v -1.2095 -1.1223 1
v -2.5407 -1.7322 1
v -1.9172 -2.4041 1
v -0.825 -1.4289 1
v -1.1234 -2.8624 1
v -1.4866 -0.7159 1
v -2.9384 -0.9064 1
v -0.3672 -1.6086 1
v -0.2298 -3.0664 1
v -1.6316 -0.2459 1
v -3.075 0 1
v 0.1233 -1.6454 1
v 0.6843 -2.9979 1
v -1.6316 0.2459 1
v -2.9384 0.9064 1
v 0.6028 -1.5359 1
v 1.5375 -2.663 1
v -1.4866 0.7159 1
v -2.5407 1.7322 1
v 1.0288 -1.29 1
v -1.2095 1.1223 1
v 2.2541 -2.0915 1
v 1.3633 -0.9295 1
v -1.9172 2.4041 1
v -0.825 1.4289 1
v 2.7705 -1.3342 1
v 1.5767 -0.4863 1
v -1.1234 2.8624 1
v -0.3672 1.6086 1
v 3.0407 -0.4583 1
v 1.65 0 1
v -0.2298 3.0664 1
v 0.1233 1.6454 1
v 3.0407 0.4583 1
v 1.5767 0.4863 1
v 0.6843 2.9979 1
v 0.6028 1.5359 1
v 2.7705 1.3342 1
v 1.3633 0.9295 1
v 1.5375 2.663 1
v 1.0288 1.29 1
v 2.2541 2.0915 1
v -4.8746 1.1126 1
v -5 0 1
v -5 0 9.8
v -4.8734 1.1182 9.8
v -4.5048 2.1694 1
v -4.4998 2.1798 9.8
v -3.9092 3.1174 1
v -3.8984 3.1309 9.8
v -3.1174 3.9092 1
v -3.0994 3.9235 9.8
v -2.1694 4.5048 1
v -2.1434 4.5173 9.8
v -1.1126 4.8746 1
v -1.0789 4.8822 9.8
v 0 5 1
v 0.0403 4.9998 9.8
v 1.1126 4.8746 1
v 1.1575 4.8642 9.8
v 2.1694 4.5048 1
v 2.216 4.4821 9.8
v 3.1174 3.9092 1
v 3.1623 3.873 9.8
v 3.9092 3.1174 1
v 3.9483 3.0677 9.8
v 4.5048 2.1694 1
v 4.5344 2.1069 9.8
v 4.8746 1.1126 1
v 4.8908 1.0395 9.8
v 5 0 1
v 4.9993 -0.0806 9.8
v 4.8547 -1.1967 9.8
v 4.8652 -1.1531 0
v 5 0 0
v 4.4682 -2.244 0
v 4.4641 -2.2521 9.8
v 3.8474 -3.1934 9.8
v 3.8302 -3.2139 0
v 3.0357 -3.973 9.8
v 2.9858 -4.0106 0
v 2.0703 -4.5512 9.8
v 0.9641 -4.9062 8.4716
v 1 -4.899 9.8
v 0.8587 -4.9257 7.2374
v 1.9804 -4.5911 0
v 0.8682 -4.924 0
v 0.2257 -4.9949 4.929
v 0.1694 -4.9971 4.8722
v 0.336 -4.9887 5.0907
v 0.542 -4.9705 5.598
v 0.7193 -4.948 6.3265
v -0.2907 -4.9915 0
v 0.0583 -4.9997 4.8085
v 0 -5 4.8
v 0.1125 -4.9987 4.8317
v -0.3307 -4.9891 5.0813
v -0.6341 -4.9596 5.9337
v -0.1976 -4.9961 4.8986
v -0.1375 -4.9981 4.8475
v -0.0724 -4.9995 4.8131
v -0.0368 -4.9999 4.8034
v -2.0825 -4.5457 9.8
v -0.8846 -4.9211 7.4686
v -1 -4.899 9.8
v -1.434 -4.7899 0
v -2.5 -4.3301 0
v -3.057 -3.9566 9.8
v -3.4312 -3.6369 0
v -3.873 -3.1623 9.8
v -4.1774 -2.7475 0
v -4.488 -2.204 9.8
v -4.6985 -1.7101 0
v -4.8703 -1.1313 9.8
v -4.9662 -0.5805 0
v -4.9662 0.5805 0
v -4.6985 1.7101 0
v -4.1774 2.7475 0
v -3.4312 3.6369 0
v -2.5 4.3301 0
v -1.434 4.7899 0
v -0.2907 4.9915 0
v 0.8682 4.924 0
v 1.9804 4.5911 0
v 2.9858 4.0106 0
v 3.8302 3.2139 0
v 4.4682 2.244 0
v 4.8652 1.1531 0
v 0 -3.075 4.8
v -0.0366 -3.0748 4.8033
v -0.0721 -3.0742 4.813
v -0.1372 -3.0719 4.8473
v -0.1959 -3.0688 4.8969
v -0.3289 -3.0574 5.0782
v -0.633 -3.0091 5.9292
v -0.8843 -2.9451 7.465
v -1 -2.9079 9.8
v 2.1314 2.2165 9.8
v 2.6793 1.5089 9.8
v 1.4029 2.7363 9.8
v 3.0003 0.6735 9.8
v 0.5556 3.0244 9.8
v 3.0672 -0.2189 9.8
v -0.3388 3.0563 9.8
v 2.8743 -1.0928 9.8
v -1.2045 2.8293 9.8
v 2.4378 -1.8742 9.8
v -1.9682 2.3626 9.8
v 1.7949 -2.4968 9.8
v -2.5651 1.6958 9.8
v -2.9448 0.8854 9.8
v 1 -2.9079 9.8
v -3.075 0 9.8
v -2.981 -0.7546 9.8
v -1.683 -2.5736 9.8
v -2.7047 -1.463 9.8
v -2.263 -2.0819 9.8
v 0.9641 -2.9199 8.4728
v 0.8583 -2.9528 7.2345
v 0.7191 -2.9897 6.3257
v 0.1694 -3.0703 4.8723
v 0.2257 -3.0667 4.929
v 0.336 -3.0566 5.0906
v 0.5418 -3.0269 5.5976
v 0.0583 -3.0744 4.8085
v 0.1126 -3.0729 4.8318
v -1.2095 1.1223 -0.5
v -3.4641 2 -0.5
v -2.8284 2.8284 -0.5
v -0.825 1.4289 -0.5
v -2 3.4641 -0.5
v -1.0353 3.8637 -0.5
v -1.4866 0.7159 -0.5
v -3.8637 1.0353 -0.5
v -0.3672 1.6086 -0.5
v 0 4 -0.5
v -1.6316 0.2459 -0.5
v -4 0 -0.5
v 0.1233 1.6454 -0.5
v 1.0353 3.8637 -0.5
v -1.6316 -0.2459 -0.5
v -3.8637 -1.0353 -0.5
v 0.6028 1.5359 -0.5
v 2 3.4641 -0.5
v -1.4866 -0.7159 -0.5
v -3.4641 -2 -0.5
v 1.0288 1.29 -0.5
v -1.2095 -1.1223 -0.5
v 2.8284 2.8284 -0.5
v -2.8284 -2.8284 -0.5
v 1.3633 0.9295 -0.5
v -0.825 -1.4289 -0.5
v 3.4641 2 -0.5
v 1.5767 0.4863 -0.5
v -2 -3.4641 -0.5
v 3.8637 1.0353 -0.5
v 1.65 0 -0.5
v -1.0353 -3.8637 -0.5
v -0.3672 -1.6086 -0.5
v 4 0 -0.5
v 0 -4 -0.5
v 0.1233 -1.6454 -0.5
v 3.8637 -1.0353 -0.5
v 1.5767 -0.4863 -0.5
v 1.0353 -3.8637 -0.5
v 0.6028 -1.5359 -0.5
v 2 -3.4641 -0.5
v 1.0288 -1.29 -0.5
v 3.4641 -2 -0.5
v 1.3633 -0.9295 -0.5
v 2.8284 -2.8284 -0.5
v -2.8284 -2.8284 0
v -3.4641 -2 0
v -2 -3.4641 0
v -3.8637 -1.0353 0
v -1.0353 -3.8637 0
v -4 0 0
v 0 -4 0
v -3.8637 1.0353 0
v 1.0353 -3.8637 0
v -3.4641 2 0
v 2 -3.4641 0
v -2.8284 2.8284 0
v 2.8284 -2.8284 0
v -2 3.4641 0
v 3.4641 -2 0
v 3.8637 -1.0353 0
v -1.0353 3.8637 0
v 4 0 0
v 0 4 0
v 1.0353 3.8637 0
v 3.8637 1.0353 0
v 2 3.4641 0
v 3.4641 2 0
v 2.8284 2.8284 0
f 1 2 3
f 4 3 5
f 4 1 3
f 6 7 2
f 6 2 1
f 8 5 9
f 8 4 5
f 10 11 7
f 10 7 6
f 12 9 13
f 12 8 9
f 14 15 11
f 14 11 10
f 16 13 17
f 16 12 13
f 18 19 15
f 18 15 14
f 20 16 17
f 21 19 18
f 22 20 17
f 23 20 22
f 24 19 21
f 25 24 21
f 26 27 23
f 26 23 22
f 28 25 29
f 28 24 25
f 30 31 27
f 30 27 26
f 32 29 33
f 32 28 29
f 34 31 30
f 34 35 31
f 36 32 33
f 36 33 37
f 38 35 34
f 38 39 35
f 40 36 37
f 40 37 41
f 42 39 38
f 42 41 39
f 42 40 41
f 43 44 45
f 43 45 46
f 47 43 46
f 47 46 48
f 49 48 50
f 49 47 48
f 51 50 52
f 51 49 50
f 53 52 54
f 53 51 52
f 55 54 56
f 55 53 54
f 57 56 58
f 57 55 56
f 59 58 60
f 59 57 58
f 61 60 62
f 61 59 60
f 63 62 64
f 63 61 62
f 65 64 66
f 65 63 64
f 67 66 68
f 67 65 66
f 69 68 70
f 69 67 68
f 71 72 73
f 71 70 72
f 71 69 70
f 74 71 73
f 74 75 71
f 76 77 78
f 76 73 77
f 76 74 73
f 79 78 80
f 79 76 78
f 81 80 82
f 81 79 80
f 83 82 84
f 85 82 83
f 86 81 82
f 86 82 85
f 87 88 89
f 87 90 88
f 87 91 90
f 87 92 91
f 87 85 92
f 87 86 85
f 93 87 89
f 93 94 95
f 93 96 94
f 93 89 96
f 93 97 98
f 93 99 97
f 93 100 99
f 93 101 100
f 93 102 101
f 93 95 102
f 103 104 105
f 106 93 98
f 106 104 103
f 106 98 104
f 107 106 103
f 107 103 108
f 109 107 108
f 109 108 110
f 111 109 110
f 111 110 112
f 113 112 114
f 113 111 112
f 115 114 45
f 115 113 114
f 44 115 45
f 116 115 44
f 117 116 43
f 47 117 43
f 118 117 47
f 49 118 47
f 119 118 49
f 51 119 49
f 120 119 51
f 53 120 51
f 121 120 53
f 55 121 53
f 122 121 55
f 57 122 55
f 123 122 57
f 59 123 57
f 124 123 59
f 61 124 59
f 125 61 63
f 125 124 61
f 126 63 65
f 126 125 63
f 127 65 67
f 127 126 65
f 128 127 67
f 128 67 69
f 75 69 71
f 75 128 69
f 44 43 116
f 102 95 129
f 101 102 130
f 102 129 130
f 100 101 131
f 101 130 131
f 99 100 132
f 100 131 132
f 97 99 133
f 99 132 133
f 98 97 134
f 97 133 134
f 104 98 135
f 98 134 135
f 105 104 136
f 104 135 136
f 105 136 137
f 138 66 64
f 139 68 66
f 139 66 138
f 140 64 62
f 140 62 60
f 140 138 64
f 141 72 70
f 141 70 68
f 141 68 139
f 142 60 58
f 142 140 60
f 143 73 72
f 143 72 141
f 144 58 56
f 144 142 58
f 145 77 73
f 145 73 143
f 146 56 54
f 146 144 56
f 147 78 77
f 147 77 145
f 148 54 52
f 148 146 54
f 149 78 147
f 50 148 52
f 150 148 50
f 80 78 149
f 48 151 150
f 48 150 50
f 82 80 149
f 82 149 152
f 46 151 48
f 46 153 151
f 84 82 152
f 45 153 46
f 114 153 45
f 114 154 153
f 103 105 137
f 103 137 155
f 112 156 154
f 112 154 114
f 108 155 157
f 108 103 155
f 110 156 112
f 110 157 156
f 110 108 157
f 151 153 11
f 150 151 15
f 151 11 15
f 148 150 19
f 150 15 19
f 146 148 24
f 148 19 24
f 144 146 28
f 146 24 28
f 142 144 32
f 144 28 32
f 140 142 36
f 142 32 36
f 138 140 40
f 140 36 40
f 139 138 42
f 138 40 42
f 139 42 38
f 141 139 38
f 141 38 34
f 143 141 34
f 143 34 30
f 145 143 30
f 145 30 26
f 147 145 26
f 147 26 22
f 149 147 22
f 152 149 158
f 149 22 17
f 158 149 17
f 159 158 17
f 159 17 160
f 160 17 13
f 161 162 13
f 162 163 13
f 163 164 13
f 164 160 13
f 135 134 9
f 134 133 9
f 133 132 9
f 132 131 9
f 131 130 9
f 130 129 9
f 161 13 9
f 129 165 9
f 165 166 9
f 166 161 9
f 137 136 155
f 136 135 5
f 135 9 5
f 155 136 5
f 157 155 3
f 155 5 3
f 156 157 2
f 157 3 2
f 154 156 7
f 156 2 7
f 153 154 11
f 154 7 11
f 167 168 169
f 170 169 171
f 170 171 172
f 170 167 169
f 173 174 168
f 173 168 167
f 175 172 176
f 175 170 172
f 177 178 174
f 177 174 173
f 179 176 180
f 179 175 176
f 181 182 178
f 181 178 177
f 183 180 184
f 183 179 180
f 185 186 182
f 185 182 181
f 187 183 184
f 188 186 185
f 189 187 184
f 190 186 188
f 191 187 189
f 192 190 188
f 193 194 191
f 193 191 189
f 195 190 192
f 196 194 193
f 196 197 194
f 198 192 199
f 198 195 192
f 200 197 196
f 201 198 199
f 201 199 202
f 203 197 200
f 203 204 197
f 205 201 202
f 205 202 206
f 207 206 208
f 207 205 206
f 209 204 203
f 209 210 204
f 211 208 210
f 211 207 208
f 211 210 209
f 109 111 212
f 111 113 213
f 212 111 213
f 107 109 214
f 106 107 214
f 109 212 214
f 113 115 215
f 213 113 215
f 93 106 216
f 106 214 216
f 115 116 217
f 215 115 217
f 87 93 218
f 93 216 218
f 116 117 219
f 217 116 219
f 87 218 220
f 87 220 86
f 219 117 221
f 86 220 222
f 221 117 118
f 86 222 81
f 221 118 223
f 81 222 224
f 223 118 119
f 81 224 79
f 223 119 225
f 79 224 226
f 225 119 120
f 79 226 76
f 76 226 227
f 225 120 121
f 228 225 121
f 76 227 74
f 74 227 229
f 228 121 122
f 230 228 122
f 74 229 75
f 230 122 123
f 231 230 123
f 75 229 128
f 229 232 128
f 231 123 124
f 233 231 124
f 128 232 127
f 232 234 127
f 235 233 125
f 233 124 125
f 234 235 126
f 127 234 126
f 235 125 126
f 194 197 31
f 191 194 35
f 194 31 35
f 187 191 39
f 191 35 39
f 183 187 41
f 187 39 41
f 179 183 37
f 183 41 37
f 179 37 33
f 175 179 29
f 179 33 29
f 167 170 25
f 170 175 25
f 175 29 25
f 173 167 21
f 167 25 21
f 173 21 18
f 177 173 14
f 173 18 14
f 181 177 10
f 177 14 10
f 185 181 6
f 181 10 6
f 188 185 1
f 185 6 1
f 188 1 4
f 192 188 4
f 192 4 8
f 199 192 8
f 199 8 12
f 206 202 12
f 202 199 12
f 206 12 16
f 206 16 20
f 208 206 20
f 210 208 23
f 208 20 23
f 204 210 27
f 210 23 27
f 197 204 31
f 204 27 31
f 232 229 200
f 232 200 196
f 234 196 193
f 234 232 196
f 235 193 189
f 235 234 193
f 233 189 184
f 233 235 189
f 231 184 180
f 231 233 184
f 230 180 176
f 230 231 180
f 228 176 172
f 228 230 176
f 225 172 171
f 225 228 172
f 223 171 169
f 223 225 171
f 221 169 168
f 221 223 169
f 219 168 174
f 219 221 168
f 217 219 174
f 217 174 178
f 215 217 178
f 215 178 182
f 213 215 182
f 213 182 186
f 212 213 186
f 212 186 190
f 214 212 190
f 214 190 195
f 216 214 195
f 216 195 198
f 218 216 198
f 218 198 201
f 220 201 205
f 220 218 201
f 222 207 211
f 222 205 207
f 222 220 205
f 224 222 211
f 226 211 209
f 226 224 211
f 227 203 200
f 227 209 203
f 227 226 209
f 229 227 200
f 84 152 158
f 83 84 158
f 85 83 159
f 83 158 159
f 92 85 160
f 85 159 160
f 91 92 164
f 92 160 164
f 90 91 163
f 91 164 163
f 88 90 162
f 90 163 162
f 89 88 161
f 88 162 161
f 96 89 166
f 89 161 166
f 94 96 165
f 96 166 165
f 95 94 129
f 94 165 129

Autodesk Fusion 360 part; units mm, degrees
sketch "Sketch1" plane through (0, 0, 0) normal (0, 0, 1) x (1, 0, 0)
  circle A0 centre (0, 0) radius 5
  circle A1 centre (0, 0) radius 1.65
  dimension "d1" = 10
  dimension "d2" = 3.3
extrude "Extrude1" add sketch "Sketch1" along normal blind 1
sketch "Sketch2" plane through (0, 0, 1) normal (0, 0, 1) x (-1, 0, 0)
  circle A0 centre (0, 0) radius 1.65
  circle A1 centre (0, 0) radius 5
  circle A2 centre (0, 0) radius 3.075
  dimension "d5" = 6.15
extrude "Extrude2" add sketch "Sketch2" along normal blind 8.8 contours A1
sketch "Sketch3" plane through (0, 0, 0) normal (0, 0, -1) x (1, 0, 0)
  circle A0 centre (0, 0) radius 1.65
  circle A1 centre (0, 0) radius 5
  circle A2 centre (0, 0) radius 4
  dimension "d8" = 8
extrude "Extrude3" add sketch "Sketch3" along normal blind 0.5 contours A2
sketch "Sketch4" plane through (0, 0, 0) normal (0, 1, 0) x (1, 0, 0)
  ellipse E0 centre (0, -9.8) end of major axis (-1, -9.8) minor radius 5
  line L0 (1, -9.8) -> (-1, -9.8)
  line L1 (0, -4.8) -> (0, -14.8)
  line L2 (-5, -9.8) -> (5, -9.8)
  line L3 (-5, 0) -> (5, 0)
  dimension "d11" = 2
  dimension "d12" = 10
  dimension "d15" = 9.8
  dimension "d16" = 9.8
extrude "Extrude4" cut sketch "Sketch4" against normal blind 15
equation "d2 = 3 mm + 0.3 mm"
equation "d15 = d16"
